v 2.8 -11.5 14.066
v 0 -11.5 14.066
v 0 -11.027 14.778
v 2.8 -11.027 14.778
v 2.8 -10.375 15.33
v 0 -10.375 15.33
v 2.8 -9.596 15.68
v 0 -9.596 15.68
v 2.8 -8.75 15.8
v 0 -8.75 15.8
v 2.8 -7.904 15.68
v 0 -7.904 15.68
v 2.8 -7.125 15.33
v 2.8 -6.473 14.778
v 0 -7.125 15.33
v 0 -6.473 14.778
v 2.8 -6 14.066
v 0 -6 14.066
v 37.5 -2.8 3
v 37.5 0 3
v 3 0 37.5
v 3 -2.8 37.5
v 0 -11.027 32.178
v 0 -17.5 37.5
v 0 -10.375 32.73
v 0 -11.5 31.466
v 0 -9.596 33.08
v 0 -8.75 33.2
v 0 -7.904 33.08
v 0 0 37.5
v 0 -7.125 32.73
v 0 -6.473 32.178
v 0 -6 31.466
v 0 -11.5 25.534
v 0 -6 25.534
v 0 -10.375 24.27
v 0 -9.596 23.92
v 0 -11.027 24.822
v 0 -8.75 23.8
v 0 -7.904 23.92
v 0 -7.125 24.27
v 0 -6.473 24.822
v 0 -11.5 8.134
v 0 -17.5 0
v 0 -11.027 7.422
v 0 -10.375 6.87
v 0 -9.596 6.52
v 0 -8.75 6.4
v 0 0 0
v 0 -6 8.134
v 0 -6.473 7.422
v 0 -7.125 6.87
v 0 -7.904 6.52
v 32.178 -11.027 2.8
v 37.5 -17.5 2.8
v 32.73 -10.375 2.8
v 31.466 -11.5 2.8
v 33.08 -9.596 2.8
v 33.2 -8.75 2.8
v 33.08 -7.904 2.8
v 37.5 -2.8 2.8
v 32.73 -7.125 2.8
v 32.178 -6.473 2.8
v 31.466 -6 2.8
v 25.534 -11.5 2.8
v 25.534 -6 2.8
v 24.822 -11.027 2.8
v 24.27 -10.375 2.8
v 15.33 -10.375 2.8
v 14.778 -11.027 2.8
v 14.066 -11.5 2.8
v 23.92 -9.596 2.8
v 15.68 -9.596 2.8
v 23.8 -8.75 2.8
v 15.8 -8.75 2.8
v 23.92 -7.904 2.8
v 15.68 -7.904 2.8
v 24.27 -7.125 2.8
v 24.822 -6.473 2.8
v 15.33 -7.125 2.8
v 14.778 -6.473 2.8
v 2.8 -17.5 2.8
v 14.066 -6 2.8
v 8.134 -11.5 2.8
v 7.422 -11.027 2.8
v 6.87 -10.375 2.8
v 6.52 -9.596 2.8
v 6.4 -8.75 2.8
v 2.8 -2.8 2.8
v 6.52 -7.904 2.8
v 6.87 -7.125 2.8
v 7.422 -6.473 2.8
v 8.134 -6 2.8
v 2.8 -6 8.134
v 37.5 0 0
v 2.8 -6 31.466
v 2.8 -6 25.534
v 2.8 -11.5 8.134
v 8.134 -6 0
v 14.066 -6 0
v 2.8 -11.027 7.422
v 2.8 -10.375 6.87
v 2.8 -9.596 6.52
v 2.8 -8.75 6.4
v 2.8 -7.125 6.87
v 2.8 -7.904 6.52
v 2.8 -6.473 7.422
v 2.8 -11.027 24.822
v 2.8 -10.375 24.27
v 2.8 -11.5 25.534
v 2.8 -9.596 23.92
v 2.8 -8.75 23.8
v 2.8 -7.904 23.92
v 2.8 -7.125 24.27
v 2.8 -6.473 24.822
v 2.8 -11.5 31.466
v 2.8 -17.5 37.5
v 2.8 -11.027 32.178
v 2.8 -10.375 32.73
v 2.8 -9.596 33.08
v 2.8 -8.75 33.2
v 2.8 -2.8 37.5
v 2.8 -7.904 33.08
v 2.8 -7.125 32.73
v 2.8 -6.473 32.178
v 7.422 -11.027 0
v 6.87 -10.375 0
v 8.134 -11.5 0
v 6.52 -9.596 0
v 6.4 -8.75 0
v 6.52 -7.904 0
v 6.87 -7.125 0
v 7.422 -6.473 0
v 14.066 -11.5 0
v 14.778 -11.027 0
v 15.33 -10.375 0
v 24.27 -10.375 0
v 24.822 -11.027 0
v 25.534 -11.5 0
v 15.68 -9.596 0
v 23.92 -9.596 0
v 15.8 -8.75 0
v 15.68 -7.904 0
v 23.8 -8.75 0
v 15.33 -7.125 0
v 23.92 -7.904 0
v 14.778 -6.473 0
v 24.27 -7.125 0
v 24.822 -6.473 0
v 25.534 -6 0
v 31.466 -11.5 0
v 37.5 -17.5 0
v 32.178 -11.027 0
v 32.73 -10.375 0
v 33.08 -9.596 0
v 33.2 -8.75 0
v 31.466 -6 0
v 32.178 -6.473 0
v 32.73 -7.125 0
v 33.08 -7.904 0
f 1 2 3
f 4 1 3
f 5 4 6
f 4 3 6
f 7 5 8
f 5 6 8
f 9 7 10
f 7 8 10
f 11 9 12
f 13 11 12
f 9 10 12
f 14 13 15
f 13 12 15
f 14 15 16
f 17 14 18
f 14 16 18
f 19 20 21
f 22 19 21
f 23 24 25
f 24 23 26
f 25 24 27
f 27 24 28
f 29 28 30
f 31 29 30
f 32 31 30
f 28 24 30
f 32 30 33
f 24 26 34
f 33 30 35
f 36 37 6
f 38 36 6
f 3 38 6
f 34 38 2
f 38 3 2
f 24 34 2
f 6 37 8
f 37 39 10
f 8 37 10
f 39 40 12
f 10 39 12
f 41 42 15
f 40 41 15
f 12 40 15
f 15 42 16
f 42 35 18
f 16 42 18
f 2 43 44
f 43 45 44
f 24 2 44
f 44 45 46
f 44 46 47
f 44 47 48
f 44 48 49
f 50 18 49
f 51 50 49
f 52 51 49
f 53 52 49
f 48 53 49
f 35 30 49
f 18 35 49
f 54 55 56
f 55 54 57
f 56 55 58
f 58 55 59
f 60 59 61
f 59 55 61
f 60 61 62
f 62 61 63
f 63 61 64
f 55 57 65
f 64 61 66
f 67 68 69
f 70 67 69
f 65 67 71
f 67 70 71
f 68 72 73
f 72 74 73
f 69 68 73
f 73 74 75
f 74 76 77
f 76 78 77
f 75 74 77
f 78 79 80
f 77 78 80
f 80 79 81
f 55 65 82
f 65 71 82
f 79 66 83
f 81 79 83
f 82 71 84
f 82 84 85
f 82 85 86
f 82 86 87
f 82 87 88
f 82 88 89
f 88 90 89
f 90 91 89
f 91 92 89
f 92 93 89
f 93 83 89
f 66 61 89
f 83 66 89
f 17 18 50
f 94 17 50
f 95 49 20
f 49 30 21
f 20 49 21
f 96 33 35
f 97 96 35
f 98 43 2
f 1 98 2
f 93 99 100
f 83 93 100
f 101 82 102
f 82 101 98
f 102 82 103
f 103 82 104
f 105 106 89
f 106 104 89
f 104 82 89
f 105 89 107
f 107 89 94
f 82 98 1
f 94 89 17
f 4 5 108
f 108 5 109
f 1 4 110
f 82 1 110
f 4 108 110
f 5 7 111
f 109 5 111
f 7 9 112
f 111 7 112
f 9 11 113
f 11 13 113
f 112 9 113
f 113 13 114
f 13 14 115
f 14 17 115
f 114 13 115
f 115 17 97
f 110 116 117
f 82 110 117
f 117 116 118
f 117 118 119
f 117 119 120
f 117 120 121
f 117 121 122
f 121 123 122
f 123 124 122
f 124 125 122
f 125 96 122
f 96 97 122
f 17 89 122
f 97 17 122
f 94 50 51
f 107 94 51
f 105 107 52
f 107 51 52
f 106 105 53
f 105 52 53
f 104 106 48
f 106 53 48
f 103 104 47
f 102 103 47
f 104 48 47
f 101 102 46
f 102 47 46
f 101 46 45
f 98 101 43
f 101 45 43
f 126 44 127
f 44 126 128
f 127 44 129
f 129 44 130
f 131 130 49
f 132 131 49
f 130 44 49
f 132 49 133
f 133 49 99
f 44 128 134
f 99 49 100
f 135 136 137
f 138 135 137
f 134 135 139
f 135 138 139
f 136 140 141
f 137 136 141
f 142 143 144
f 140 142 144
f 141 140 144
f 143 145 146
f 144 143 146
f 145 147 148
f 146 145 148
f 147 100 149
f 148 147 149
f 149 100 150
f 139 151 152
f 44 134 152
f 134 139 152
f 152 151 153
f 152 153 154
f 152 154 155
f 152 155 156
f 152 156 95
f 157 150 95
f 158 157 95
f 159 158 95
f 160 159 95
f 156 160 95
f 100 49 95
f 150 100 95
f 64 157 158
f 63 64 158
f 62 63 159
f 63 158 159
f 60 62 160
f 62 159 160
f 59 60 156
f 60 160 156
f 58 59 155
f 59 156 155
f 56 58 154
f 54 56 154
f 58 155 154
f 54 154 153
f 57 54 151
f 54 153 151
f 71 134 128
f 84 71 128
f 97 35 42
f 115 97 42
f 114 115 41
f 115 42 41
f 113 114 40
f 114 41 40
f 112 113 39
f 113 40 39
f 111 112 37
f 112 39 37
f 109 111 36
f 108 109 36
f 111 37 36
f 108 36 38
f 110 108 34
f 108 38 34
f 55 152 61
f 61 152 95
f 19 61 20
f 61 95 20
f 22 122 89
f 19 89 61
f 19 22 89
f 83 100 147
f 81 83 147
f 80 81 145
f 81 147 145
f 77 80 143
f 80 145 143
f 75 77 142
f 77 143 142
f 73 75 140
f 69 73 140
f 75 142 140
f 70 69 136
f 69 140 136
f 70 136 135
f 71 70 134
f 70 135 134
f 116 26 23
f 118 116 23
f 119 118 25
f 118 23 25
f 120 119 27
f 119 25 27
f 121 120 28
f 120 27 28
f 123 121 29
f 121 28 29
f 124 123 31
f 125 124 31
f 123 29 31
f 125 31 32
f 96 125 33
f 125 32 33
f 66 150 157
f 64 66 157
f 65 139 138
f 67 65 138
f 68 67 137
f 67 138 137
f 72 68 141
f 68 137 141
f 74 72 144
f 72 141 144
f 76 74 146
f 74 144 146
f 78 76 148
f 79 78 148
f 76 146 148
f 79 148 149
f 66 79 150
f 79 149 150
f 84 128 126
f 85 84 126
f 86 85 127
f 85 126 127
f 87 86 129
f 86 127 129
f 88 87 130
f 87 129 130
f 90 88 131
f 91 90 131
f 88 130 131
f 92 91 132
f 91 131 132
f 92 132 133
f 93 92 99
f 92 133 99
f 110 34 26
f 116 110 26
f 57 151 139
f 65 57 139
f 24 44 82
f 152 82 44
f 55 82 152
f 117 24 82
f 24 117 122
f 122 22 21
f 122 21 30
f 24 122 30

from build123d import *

# Parameters (mm, degrees)
F1_DEPTH = 17.5
F2_DEPTH = 2.8
F4_DEPTH = 2.8
F6_DEPTH = 2.8


with BuildPart() as f1:
    # F0 (on Front) → F1 (new body)
    with BuildSketch(Plane.XZ):
        Polygon((0, 37.5), (0, 0), (37.5, 0), (37.5, 2.8), (2.8, 2.8), (2.8, 37.5), align=None)
    extrude(amount=F1_DEPTH)

    # F0 (on Front) → F2 (join)
    with BuildSketch(Plane.XZ):
        Polygon((2.8, 2.8), (37.5, 2.8), (37.5, 3), (3, 37.5), (2.8, 37.5), align=None)
    extrude(amount=F2_DEPTH)

    # F3 (on face) → F4 (cut, through all)
    with BuildSketch(Plane(origin=(0, 0, 0), x_dir=(0, -1, 0), z_dir=(-1, 0, 0))):
        with BuildLine():
            ThreePointArc((11.5, 31.4665), (8.75, 33.20004), (6, 31.4665))
            Line((6, 31.4665), (6, 25.5335))
            ThreePointArc((6, 25.5335), (8.75, 23.79996), (11.5, 25.5335))
            Line((11.5, 25.5335), (11.5, 31.4665))
        make_face()
        with BuildLine():
            ThreePointArc((11.5, 14.0665), (8.75, 15.80004), (6, 14.0665))
            Line((6, 14.0665), (6, 8.1335))
            ThreePointArc((6, 8.1335), (8.75, 6.39996), (11.5, 8.1335))
            Line((11.5, 8.1335), (11.5, 14.0665))
        make_face()
    extrude(amount=-F4_DEPTH, mode=Mode.SUBTRACT)

    # F5 (on face) → F6 (cut, through all)
    with BuildSketch(Plane(origin=(0, 0, 0), x_dir=(1, 0, 0), z_dir=(0, 0, -1))):
        with BuildLine():
            ThreePointArc((25.5335, 11.5), (23.79996, 8.75), (25.5335, 6))
            Line((25.5335, 6), (31.4665, 6))
            ThreePointArc((31.4665, 6), (33.20004, 8.75), (31.4665, 11.5))
            Line((31.4665, 11.5), (25.5335, 11.5))
        make_face()
        with BuildLine():
            ThreePointArc((8.1335, 11.5), (6.39996, 8.75), (8.1335, 6))
            Line((8.1335, 6), (14.0665, 6))
            ThreePointArc((14.0665, 6), (15.80004, 8.75), (14.0665, 11.5))
            Line((14.0665, 11.5), (8.1335, 11.5))
        make_face()
    extrude(amount=-F6_DEPTH, mode=Mode.SUBTRACT)


solid = f1.part
